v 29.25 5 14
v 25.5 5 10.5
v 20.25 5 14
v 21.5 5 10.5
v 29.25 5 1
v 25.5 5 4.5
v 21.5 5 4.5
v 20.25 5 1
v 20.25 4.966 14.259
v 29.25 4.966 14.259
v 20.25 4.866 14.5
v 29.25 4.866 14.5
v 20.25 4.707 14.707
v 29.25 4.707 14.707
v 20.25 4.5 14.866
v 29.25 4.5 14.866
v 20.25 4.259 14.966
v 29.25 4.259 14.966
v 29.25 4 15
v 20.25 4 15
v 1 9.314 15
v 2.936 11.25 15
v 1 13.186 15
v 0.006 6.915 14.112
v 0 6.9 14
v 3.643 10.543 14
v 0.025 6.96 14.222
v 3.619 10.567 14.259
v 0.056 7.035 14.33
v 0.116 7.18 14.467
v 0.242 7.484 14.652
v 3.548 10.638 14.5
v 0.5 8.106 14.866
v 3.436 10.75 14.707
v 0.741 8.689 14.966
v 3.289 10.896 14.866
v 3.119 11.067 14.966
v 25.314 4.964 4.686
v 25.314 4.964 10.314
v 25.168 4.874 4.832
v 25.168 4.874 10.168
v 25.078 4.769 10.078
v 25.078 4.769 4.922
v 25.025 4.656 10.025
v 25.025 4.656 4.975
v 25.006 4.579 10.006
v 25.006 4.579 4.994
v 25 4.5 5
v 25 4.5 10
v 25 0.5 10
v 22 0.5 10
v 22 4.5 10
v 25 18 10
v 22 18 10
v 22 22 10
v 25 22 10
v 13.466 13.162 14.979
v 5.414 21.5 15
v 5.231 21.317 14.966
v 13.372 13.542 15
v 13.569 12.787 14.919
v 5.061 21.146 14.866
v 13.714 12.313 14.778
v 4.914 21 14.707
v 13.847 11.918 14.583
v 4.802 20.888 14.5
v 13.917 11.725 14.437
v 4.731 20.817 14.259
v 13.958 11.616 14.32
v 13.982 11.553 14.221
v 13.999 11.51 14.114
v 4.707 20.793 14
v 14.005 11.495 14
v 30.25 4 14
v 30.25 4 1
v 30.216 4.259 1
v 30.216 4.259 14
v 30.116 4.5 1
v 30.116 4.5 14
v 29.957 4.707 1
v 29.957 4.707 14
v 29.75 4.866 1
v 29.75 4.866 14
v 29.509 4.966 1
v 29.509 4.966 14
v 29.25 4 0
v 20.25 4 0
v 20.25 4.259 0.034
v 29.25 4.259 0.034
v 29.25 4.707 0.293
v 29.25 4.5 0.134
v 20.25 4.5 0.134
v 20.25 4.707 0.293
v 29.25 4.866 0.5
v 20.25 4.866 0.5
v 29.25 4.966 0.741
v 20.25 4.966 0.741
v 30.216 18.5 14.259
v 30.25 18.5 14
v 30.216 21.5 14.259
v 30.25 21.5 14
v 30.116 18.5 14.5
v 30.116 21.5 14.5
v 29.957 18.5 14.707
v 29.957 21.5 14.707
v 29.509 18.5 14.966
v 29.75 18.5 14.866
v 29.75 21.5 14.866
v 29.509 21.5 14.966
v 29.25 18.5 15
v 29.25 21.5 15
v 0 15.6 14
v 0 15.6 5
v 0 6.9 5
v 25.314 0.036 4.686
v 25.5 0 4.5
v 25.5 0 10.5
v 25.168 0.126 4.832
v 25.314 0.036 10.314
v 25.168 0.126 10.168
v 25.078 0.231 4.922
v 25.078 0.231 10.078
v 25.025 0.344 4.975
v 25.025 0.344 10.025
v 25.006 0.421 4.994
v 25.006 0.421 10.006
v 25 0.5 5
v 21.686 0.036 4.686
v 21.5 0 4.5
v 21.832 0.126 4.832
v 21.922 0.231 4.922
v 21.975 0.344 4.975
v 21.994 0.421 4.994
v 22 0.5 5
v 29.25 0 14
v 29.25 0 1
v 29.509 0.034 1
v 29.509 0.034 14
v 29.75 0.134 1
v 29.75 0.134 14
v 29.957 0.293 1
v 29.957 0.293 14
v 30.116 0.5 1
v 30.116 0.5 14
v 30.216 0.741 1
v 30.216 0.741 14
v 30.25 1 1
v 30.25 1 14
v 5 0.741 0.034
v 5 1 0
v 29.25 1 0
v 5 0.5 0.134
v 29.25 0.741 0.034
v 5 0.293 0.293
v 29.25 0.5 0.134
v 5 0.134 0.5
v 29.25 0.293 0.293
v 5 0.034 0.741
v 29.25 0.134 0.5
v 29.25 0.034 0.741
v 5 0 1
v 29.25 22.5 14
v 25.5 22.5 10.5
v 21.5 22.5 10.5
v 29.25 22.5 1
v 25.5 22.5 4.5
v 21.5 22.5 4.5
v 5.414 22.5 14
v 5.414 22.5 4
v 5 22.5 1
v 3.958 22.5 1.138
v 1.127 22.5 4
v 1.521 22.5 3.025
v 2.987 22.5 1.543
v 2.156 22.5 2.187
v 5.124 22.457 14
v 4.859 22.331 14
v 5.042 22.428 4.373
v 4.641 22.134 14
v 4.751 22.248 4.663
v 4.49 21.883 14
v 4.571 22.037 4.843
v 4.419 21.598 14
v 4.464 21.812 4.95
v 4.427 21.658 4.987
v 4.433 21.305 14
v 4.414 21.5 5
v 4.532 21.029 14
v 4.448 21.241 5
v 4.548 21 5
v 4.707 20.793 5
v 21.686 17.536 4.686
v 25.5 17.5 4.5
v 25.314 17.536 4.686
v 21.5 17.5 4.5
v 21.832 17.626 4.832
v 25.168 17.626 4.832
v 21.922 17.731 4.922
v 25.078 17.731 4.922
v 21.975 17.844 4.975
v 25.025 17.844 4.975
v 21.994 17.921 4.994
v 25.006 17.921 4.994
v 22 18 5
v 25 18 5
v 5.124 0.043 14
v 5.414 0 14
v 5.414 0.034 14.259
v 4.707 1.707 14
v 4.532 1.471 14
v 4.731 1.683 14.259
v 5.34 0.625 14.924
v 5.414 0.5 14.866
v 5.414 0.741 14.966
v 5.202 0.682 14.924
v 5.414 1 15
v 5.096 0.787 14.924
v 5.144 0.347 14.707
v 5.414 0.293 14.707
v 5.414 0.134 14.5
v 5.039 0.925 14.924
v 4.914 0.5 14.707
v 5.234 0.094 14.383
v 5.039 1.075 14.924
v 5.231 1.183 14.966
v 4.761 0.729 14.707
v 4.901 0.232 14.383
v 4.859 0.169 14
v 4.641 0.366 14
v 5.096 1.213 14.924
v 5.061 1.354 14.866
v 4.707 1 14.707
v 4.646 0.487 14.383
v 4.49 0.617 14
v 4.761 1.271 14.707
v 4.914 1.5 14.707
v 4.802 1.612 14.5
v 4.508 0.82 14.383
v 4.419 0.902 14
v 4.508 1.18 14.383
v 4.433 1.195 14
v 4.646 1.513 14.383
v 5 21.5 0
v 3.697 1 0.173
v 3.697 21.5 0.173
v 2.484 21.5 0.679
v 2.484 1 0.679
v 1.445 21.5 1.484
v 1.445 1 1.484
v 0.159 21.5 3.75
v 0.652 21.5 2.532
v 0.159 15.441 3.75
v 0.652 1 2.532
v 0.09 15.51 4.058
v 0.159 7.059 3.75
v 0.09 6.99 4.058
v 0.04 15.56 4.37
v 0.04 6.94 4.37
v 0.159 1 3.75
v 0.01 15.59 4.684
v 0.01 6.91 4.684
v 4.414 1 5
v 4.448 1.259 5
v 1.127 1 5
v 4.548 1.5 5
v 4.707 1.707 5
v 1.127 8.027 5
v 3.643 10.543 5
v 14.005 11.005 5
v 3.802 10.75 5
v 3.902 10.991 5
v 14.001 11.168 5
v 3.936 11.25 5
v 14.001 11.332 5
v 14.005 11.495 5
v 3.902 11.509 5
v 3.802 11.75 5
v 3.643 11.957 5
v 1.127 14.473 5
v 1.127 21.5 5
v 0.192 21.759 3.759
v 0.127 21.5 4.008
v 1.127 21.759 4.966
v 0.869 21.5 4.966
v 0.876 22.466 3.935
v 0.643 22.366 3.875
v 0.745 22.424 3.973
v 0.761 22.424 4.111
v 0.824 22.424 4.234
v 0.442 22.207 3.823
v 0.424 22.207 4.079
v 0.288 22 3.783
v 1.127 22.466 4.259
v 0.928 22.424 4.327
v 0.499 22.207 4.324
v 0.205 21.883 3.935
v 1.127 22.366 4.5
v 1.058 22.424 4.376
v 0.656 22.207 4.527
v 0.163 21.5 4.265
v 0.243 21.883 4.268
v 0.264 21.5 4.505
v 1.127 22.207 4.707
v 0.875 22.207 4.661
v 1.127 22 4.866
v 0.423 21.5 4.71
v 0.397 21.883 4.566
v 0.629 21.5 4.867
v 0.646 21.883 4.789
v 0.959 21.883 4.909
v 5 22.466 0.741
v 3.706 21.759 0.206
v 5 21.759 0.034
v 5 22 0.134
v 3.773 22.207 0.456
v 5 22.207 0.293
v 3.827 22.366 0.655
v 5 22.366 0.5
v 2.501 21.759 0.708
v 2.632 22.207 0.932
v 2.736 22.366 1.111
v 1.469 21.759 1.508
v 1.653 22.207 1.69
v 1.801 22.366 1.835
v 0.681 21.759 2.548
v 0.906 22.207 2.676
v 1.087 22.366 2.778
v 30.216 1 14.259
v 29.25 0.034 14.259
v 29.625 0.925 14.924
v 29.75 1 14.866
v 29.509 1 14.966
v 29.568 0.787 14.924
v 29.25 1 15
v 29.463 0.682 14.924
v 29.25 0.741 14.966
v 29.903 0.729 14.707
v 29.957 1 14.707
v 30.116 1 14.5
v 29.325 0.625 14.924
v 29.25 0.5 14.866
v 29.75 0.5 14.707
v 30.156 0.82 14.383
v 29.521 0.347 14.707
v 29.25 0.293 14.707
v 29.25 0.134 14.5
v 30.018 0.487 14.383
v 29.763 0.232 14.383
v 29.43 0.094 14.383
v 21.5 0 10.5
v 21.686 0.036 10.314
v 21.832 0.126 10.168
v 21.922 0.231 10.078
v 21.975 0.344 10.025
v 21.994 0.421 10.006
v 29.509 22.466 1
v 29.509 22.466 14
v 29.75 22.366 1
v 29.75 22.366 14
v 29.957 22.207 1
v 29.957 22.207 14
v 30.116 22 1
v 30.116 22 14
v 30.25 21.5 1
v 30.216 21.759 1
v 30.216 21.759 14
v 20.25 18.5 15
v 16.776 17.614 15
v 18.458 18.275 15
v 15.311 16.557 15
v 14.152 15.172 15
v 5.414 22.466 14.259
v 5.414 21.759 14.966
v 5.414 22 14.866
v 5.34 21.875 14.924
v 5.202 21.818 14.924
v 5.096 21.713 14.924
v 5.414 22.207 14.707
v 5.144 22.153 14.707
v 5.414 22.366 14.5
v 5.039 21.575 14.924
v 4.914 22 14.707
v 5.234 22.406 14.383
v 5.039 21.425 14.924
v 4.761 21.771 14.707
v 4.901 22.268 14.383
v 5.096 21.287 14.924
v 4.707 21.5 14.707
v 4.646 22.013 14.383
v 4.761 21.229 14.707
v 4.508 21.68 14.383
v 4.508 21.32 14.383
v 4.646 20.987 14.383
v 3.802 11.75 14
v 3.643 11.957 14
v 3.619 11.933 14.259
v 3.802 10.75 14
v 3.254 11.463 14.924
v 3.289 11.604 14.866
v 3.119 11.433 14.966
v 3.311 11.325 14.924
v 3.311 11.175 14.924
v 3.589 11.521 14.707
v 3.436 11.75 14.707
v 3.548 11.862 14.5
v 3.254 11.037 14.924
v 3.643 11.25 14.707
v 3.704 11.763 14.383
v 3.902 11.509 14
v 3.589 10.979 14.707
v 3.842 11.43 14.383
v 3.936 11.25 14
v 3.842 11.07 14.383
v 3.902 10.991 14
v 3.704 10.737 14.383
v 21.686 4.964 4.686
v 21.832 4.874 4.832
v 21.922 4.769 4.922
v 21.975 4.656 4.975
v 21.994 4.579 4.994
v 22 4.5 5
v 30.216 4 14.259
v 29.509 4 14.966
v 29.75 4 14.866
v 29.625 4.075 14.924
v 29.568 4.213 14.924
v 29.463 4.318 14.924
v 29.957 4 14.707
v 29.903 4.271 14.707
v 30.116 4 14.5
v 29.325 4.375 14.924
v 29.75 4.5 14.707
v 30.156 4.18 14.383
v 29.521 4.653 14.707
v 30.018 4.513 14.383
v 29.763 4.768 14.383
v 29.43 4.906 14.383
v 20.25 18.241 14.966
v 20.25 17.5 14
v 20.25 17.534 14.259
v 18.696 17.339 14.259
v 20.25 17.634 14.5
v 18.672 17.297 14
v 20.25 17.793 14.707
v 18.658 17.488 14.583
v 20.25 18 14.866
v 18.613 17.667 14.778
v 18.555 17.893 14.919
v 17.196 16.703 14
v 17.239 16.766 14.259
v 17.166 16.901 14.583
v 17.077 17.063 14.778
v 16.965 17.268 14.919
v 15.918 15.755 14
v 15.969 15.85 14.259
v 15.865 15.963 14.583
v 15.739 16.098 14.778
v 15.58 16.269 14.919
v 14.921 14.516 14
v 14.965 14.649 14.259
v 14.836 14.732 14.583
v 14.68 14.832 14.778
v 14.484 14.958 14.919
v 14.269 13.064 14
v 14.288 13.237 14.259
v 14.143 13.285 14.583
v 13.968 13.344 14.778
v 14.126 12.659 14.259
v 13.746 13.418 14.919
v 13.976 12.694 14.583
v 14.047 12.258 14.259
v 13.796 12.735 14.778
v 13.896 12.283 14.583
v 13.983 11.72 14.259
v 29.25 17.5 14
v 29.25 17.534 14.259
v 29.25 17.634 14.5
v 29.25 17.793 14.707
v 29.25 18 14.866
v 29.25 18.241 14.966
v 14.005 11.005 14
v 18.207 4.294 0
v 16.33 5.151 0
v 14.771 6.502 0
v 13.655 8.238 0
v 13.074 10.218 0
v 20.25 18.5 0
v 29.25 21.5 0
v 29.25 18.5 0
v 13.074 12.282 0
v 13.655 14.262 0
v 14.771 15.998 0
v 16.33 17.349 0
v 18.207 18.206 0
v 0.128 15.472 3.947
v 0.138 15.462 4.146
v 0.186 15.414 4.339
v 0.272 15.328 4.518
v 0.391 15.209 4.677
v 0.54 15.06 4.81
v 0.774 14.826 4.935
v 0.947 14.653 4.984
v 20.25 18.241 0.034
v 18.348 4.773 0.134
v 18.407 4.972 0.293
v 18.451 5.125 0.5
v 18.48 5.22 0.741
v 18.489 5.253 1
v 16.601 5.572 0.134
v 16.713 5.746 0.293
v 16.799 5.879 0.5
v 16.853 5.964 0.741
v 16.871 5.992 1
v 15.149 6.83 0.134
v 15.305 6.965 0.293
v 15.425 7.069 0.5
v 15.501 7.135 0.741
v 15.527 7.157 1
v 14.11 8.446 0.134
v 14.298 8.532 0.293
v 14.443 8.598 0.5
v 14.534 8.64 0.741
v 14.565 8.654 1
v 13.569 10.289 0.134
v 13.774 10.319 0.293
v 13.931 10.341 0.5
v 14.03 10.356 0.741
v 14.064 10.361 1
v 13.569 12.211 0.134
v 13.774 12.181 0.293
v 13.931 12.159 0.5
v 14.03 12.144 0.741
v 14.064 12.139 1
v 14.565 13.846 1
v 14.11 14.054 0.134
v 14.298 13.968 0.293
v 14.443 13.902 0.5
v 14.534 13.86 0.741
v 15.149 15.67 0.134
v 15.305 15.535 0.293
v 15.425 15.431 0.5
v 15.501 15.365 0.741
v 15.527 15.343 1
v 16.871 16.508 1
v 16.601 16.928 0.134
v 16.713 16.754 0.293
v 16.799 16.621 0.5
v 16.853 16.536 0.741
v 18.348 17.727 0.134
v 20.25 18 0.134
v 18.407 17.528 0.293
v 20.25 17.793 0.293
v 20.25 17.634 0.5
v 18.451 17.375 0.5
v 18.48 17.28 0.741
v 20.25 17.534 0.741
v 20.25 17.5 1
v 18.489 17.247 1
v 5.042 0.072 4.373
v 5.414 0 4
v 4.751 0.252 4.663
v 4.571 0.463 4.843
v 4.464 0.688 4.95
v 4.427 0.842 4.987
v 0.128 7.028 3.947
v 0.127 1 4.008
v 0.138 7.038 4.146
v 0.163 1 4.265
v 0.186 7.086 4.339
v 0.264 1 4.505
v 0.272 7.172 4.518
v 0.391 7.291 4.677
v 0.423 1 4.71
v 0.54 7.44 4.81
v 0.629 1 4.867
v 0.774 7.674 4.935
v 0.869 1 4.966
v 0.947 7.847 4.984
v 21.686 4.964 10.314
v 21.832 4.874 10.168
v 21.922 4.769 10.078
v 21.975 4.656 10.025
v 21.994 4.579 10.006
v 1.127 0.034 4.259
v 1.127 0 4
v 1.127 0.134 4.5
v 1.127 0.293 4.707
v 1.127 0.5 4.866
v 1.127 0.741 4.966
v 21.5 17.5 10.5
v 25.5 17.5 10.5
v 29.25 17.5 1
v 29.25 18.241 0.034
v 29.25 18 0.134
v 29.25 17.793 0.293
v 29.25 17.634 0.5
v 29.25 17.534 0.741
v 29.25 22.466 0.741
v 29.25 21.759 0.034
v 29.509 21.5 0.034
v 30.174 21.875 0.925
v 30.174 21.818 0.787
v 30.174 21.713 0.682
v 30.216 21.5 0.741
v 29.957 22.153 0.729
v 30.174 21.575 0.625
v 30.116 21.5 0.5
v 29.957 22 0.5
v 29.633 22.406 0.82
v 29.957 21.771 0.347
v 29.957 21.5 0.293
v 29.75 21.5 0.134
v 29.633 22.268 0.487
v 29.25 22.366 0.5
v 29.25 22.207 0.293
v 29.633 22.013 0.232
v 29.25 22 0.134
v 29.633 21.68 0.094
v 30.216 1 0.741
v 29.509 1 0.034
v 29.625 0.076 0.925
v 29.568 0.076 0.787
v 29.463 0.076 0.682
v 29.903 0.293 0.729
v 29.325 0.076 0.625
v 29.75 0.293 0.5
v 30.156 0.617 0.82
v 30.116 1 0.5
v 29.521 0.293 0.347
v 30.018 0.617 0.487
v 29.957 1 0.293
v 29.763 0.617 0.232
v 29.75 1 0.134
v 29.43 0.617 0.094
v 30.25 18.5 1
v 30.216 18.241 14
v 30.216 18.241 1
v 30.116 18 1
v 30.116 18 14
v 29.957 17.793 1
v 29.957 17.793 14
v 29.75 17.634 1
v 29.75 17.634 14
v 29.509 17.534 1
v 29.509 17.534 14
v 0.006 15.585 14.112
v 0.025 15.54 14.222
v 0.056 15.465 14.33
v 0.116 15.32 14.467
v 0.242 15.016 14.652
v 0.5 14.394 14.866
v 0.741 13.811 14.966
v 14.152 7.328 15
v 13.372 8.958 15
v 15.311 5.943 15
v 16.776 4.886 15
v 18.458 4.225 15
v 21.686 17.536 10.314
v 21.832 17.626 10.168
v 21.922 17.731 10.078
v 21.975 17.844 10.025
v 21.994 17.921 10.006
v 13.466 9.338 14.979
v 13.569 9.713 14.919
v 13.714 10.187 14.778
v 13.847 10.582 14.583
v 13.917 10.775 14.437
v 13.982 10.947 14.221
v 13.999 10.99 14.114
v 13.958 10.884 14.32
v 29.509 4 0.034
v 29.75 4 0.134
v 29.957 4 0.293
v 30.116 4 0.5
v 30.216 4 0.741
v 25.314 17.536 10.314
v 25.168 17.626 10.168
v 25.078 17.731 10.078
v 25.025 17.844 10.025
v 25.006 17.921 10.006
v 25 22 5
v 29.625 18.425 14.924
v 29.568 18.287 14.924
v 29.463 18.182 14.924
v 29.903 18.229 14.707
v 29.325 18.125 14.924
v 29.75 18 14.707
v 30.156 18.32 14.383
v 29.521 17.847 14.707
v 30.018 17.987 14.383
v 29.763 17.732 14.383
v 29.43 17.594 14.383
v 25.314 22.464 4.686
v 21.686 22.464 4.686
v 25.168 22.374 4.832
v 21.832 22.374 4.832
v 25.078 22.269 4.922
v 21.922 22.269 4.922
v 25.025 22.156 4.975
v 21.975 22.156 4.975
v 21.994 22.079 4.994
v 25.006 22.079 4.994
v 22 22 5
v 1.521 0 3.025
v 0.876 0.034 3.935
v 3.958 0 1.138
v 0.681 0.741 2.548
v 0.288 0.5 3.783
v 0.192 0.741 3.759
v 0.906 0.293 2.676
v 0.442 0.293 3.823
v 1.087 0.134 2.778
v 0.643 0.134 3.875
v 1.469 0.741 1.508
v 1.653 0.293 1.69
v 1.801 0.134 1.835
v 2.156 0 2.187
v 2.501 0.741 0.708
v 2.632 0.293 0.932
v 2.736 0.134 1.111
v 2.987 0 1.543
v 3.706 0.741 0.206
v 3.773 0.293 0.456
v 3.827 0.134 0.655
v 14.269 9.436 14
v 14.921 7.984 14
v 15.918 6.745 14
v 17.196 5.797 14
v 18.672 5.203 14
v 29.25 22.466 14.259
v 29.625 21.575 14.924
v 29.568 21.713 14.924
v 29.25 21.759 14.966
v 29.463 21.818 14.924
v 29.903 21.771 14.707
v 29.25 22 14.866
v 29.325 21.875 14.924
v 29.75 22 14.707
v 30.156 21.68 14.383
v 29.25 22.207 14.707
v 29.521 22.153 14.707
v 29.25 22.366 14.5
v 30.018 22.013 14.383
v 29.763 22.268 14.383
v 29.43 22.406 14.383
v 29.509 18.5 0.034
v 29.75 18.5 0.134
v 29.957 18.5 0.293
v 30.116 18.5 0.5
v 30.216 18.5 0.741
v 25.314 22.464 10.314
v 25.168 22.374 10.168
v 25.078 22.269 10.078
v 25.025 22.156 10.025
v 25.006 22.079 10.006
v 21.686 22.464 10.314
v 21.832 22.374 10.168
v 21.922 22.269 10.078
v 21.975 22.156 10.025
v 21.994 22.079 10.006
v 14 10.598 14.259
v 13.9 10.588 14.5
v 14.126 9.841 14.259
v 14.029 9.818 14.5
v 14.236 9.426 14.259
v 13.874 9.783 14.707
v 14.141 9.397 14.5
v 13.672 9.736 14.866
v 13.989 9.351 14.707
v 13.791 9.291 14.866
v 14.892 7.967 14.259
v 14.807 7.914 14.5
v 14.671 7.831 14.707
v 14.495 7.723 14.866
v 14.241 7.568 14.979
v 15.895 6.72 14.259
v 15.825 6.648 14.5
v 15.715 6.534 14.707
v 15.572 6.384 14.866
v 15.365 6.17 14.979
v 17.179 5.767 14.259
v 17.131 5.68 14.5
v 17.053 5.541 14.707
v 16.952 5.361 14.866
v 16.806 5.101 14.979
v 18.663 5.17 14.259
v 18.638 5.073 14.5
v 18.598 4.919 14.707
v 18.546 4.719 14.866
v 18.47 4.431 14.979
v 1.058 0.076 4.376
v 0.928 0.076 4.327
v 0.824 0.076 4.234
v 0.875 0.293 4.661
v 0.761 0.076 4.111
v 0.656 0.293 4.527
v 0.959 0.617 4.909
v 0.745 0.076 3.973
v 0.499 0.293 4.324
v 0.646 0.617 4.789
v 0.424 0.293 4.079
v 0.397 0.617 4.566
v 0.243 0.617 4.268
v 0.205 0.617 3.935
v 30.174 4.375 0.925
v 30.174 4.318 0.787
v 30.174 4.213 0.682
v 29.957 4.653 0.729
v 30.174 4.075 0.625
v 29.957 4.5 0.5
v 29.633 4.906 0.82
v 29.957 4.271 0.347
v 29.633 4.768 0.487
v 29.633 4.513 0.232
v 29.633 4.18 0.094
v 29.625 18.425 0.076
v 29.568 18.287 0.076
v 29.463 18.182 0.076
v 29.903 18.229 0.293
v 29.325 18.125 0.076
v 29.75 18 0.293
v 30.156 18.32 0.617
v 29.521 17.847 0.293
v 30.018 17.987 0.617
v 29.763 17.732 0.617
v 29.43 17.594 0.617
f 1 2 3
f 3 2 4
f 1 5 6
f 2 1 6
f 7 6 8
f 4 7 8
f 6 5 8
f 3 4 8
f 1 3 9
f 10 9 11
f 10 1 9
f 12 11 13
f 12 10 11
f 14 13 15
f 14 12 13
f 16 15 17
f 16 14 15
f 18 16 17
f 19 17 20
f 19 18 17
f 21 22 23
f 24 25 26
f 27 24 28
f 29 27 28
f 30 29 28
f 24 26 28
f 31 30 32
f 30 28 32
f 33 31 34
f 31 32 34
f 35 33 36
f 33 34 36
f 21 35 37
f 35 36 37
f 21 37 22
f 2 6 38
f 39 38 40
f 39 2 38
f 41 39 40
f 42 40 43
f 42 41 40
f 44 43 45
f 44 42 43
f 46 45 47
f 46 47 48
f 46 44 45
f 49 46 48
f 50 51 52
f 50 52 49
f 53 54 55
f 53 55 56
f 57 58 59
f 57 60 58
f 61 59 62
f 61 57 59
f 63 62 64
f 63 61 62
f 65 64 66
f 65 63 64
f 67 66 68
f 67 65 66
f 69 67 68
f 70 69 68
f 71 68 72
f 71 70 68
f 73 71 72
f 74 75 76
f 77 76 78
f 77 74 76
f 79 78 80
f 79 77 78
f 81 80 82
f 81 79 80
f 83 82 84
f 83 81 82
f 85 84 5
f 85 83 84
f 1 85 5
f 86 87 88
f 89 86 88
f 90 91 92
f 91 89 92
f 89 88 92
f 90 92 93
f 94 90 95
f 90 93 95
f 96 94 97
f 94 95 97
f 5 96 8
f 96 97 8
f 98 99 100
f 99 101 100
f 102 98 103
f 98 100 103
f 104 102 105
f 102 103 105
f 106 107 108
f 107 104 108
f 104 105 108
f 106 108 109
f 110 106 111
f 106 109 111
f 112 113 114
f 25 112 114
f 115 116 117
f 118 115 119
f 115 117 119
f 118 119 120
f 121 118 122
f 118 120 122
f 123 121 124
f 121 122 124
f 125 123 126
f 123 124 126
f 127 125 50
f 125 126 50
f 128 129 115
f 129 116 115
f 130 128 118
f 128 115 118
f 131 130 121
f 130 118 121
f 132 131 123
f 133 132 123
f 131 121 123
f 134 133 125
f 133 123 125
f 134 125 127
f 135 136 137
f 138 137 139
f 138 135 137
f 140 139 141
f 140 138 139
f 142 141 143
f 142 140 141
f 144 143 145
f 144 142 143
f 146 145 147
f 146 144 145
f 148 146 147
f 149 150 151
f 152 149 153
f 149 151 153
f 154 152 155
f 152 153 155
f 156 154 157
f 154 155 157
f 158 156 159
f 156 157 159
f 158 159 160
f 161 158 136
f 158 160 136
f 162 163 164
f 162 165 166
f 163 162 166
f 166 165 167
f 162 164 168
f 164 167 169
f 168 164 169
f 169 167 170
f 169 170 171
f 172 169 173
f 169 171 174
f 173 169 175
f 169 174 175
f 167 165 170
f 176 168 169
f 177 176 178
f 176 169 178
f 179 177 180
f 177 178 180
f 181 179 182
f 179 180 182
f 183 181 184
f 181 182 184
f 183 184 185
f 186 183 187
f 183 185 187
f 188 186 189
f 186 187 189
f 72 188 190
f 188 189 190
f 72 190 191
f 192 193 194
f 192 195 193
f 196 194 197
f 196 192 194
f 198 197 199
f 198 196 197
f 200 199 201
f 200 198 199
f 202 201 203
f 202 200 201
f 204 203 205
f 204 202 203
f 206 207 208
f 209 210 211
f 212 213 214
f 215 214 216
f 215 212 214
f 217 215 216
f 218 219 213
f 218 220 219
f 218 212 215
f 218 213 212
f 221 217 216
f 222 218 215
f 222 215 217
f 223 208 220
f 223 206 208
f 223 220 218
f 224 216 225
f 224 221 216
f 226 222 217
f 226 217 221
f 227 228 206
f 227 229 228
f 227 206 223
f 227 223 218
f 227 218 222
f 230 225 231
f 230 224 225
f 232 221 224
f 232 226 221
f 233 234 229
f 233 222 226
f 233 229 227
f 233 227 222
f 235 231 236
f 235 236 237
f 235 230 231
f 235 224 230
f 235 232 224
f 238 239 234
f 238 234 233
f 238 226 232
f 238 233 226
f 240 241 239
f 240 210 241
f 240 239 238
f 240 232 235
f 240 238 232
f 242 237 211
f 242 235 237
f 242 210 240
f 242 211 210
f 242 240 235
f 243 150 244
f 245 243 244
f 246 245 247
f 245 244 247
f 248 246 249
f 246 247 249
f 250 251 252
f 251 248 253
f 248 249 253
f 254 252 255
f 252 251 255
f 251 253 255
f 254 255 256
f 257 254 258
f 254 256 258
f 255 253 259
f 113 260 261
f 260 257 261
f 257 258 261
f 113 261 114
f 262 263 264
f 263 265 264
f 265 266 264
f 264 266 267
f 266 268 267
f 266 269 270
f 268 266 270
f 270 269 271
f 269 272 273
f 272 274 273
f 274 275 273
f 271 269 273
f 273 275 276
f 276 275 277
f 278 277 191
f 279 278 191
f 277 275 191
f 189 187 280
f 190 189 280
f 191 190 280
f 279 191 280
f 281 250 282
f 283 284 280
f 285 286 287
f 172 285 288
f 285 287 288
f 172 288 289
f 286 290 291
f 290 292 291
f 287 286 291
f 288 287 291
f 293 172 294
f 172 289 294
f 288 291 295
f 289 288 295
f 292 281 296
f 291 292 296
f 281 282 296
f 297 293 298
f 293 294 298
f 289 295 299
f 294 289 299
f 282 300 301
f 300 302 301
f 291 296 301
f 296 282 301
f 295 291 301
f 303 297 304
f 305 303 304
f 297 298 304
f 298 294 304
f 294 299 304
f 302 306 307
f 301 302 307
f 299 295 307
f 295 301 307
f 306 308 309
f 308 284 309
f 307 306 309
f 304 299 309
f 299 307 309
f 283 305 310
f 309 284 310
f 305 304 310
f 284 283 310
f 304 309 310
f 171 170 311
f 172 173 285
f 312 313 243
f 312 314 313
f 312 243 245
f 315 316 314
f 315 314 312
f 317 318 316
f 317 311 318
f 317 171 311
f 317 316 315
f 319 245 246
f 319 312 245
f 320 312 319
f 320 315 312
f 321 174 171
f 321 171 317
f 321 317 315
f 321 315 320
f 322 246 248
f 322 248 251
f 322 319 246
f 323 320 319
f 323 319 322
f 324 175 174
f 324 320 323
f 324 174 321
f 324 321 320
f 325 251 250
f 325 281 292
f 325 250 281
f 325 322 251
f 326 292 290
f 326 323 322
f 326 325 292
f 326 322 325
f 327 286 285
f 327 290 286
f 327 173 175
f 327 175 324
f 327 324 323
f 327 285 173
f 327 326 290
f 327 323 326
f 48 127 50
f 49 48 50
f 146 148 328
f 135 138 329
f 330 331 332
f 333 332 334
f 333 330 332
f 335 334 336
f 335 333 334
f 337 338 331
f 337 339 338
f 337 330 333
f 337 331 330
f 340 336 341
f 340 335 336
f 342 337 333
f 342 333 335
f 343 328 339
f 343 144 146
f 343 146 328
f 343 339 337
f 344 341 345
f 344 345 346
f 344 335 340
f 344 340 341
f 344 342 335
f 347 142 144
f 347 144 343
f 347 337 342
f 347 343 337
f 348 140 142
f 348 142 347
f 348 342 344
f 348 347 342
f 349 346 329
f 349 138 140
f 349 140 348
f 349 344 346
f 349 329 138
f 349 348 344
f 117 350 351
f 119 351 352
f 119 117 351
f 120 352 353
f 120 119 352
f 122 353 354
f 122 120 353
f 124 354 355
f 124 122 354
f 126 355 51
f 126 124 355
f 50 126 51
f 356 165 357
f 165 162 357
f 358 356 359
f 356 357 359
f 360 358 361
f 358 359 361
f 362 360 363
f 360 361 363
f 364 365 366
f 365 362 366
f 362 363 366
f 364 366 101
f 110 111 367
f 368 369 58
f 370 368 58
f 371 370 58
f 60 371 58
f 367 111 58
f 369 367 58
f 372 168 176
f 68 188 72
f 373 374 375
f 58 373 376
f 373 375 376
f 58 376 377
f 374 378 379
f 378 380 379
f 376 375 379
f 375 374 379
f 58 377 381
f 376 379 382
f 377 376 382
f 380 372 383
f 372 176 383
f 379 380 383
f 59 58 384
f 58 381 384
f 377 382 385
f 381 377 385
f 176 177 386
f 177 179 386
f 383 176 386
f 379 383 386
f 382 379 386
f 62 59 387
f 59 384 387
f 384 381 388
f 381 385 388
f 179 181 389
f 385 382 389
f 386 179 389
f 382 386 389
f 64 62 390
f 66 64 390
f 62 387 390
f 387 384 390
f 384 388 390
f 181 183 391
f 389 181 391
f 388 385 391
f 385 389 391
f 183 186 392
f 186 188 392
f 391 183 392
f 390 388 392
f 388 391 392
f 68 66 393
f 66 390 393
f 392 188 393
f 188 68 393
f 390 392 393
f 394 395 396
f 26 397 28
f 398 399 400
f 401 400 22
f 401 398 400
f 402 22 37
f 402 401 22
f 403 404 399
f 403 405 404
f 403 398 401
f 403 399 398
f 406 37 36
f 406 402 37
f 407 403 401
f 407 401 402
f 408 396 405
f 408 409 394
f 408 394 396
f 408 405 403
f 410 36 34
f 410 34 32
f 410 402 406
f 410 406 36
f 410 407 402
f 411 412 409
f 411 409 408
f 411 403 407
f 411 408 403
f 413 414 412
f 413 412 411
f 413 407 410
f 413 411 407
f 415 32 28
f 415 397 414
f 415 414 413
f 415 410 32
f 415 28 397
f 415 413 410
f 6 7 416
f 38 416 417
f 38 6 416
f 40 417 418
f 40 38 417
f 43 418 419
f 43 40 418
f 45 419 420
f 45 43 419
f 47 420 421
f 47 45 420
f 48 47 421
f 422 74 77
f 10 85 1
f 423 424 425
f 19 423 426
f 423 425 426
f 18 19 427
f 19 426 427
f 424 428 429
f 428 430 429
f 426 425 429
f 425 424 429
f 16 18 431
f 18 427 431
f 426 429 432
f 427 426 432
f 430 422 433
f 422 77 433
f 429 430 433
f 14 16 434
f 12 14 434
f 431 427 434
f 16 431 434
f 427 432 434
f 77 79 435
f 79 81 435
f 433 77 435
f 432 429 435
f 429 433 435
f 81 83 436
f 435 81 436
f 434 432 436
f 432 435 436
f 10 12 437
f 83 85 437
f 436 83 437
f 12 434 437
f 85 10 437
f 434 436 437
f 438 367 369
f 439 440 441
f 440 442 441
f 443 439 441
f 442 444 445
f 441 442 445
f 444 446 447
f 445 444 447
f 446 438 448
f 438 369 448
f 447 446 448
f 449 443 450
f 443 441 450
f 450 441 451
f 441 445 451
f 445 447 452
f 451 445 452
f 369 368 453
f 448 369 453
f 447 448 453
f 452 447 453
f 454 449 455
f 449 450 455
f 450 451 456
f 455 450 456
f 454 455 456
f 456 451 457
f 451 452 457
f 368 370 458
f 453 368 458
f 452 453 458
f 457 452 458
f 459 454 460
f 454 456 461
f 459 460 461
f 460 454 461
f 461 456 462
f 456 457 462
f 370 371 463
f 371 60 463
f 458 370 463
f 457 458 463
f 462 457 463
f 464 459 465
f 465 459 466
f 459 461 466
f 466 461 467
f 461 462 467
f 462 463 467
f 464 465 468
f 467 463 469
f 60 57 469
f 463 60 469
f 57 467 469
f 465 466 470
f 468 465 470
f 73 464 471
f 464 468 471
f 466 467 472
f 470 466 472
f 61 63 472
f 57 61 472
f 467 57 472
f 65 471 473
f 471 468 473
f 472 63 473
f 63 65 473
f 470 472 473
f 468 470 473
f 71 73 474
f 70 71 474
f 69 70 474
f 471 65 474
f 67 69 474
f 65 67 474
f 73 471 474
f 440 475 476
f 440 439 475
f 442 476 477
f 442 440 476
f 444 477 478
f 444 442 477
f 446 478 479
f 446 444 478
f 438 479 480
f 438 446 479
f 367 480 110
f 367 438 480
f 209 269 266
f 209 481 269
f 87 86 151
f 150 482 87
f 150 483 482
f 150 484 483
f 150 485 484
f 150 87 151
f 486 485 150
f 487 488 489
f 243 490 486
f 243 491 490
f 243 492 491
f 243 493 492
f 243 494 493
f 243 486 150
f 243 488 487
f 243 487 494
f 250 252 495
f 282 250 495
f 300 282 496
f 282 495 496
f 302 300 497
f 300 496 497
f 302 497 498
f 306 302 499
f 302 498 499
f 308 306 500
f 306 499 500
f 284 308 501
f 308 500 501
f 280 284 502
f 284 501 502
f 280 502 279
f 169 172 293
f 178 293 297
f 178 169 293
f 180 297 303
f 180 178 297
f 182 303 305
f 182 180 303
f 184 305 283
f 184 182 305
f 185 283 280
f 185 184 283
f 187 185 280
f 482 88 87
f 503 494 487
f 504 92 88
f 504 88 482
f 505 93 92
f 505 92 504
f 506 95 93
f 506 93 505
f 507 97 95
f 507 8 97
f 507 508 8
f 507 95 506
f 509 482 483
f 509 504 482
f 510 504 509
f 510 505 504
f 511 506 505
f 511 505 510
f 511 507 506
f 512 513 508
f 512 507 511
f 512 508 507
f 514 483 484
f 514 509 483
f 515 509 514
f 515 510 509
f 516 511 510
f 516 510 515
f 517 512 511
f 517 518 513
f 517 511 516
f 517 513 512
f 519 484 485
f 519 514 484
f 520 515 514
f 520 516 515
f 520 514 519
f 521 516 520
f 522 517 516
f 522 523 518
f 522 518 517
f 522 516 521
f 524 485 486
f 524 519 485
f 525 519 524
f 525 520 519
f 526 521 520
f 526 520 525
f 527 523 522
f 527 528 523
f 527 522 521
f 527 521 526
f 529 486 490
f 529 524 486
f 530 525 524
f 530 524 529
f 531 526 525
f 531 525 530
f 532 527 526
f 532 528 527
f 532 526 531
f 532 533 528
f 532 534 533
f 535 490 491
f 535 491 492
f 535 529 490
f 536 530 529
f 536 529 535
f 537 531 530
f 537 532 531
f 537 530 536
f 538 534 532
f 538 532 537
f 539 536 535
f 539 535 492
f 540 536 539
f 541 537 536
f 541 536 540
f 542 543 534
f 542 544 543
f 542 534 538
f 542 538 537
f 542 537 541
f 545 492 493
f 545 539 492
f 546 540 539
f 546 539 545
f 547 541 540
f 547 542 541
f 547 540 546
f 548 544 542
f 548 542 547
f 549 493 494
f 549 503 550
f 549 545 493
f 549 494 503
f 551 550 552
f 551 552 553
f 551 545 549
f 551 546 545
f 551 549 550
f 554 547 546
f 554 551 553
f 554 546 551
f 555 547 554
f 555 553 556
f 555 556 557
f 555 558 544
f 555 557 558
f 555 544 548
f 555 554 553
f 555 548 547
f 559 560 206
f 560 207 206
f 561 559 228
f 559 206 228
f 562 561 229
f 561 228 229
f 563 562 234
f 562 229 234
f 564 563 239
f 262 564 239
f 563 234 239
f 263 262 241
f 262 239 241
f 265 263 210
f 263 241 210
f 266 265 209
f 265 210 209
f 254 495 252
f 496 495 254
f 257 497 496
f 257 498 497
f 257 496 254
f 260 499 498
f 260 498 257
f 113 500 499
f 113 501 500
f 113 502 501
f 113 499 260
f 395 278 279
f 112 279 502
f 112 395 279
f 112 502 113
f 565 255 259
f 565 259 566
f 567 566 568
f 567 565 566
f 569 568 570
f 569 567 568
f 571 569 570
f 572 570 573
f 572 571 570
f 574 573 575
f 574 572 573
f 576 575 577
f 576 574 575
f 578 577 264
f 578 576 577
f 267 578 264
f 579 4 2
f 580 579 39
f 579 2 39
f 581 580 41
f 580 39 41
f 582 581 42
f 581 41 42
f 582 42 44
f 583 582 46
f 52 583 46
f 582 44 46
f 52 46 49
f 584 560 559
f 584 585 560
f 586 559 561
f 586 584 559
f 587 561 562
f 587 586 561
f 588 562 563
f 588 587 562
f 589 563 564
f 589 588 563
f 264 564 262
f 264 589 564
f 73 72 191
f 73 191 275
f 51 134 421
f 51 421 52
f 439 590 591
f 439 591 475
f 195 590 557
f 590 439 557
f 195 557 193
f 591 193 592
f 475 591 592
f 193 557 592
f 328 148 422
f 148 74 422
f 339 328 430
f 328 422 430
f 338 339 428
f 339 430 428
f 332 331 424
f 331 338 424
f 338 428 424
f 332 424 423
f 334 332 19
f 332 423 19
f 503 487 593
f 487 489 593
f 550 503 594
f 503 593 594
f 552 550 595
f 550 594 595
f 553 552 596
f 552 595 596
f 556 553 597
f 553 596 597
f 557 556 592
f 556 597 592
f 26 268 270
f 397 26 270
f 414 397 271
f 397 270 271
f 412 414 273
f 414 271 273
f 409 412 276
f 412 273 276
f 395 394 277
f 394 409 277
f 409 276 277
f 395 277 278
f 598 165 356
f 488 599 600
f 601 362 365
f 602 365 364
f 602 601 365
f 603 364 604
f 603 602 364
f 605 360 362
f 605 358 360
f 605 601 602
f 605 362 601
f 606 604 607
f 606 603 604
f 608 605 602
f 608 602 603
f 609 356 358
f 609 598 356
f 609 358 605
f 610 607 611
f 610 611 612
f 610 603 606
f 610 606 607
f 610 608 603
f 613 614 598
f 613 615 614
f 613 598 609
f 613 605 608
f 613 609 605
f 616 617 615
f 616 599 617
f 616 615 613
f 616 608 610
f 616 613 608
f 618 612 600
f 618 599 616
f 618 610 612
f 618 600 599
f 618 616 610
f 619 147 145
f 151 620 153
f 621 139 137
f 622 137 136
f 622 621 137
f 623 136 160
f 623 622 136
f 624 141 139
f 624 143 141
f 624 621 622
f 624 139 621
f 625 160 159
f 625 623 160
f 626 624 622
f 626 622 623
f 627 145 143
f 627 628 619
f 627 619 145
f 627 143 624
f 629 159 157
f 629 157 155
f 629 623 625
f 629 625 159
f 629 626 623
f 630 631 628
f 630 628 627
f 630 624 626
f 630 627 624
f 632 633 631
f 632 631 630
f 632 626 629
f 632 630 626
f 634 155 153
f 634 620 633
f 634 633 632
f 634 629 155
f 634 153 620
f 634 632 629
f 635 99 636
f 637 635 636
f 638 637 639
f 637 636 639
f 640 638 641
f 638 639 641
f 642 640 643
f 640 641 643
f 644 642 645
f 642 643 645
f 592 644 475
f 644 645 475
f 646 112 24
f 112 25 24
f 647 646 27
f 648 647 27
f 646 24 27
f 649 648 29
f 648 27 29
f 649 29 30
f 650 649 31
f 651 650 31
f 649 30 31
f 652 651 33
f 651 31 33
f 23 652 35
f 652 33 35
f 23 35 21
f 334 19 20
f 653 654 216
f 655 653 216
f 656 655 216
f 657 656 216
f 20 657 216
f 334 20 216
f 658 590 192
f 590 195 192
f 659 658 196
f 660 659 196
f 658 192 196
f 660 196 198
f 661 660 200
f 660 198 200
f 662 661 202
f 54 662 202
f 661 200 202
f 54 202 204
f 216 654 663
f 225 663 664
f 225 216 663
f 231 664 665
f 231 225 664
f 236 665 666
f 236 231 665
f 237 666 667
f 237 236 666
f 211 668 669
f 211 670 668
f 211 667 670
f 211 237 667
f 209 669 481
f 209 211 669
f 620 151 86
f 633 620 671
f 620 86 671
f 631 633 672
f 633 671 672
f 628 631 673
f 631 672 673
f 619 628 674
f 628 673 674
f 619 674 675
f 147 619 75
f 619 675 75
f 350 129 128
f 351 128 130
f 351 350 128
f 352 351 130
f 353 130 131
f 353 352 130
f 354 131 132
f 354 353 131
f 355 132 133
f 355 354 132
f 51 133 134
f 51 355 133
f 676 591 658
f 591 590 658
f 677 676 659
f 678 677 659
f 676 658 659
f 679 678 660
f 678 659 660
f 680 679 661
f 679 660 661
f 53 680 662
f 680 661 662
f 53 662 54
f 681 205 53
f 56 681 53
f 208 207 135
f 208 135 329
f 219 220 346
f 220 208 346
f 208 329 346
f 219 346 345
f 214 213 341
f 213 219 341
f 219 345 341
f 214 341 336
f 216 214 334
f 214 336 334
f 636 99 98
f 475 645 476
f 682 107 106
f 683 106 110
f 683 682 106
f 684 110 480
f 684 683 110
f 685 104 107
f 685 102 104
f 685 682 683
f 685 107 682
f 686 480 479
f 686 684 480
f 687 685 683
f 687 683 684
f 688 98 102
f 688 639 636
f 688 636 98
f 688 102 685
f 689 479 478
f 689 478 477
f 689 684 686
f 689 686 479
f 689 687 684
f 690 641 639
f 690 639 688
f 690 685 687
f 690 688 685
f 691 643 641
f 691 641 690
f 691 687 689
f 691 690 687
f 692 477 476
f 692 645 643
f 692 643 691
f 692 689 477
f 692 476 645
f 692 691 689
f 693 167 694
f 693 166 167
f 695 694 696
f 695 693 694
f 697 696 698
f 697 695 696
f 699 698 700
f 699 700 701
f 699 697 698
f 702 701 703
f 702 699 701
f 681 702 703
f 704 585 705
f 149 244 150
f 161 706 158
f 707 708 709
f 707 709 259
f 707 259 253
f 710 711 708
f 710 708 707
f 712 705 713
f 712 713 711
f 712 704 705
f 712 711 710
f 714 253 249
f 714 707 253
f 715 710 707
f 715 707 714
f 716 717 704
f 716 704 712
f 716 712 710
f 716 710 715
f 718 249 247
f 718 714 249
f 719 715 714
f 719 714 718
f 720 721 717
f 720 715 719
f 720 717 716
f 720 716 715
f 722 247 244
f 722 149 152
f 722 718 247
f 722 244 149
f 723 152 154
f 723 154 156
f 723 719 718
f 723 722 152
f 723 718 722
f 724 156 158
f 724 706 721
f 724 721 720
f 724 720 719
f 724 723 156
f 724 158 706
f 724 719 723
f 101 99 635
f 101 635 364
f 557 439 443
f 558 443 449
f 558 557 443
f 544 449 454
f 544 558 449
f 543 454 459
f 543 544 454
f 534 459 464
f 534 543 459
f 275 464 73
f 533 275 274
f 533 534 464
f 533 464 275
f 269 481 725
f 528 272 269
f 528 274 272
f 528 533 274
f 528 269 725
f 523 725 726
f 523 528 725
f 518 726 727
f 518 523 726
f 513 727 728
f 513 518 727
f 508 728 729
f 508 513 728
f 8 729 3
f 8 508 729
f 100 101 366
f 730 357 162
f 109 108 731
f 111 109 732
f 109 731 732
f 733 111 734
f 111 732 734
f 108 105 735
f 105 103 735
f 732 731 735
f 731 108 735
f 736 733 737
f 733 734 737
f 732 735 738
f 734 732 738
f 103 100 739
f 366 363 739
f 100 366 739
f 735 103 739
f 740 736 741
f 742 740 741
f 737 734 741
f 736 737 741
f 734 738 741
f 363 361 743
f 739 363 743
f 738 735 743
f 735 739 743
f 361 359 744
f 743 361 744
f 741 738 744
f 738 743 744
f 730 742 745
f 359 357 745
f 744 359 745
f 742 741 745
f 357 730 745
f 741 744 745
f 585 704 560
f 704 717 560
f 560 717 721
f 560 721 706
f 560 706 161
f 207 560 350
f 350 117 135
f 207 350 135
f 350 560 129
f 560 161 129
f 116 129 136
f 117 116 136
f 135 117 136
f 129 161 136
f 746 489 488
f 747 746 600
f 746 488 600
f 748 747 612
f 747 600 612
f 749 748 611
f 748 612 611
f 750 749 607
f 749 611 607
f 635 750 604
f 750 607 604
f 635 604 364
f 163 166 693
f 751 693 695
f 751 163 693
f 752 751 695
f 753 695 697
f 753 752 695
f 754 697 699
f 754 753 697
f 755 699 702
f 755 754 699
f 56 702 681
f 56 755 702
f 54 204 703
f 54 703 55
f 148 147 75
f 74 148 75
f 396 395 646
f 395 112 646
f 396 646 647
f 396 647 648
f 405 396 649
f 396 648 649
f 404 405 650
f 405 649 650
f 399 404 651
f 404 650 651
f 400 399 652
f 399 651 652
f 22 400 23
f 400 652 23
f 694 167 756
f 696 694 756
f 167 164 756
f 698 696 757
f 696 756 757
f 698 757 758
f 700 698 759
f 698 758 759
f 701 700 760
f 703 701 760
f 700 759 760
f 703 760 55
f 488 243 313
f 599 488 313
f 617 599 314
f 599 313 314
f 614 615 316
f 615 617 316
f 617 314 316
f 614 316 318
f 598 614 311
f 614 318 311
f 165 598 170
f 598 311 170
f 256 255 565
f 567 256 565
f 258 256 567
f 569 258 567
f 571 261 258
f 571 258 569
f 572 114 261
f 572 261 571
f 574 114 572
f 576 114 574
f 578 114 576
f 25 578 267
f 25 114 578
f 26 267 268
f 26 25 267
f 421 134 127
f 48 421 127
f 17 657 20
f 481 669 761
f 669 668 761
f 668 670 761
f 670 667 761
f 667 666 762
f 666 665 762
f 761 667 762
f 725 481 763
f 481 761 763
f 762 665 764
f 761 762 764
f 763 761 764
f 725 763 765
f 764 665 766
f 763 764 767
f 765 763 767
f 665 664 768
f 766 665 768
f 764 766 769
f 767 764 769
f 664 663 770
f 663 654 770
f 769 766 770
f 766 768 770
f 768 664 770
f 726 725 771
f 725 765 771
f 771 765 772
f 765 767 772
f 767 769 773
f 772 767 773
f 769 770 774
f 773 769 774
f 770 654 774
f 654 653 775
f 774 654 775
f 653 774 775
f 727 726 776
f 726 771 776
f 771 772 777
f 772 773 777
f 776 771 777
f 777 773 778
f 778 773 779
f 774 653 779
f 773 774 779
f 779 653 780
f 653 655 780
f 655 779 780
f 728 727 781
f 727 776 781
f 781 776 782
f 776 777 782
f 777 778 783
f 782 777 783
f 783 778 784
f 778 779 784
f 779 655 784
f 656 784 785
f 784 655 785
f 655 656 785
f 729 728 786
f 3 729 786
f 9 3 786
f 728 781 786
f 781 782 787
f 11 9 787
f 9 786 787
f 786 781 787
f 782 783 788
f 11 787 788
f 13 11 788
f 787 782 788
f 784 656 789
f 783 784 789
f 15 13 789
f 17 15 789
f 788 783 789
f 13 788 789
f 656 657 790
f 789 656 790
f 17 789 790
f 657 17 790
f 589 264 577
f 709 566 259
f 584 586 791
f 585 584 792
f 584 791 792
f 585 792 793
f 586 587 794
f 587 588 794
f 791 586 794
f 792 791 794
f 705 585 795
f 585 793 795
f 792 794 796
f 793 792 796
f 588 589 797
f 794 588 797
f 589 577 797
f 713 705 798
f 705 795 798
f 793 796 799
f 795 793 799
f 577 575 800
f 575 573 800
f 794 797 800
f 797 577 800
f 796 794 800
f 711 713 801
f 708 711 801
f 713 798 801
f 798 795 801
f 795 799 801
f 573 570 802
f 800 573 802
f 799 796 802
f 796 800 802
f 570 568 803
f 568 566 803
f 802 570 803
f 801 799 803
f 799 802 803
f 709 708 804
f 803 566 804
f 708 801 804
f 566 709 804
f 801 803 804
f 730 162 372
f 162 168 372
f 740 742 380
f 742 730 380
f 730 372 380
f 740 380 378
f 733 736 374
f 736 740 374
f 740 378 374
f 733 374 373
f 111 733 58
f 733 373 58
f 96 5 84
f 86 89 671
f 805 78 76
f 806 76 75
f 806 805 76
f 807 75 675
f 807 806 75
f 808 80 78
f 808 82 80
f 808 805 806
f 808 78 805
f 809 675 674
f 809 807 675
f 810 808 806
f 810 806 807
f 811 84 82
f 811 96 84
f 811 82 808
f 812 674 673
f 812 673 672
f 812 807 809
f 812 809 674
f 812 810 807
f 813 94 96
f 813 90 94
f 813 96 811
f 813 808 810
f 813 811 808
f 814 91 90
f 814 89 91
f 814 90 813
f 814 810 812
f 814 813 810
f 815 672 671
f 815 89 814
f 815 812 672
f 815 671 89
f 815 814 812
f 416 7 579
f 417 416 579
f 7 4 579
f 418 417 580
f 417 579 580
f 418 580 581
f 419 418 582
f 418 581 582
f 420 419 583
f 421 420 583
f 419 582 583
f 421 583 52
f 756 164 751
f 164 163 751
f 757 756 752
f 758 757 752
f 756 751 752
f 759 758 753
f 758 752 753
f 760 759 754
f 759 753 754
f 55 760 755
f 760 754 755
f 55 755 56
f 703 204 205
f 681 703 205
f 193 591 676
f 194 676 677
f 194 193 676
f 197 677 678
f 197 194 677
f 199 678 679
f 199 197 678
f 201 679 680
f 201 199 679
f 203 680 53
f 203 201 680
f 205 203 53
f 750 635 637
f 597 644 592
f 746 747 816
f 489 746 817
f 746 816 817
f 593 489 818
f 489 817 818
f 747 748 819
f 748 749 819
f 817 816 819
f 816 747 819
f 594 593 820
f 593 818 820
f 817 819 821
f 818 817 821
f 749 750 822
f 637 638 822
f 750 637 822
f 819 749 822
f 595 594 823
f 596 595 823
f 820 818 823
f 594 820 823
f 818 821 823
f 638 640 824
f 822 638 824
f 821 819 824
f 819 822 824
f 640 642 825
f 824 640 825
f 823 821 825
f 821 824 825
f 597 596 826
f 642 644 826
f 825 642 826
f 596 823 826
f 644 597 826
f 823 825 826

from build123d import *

# Parameters (mm, degrees)
PAD_DEPTH       = 15
POCKET_DEPTH    = 10
FILLET_R        = 5
SKETCH002_W     = 3
SKETCH002_H     = 5
POCKET001_DEPTH = 22.501
FILLET001_R     = 1
FILLET002_R     = 0.5


with BuildPart() as part:
    # Sketch → Pad (new body)
    with BuildSketch(Plane.XY):
        with BuildLine():
            ThreePointArc((20.25, 17.5), (14, 11.25), (20.25, 5))
            Line((30.25, 5), (20.25, 5))
            Line((30.25, 0), (30.25, 5))
            Line((0, 0), (30.25, 0))
            Line((0, 22.5), (0, 0))
            Line((30.25, 22.5), (0, 22.5))
            Line((30.25, 17.5), (30.25, 22.5))
            Line((20.25, 17.5), (30.25, 17.5))
        make_face()
    extrude(amount=PAD_DEPTH)

    # Sketch001 (on Face10 of Pad) → Pocket (cut)
    with BuildSketch(Plane.XY.offset(15)):
        Polygon((-0.75, 16.35), (-0.75, 26.25), (14.25, 11.25), (-0.75, -3.75), (-0.75, 6.15), (4.35, 11.25), align=None)
    extrude(amount=-POCKET_DEPTH, mode=Mode.SUBTRACT)

    # Fillet
    fillet_edges = [part.edges().sort_by_distance(p)[0] for p in [
        (0, 11.25, 0),
    ]]
    fillet(fillet_edges, radius=FILLET_R)

    # Sketch002 (on Face2 of Fillet) → Pocket001 (cut, through all)
    with BuildSketch(Plane.XZ):
        with Locations((23.5, 7.5)):
            Rectangle(SKETCH002_W, SKETCH002_H)
    extrude(amount=-POCKET001_DEPTH, mode=Mode.SUBTRACT)

    # Fillet001
    fillet001_edges = [part.edges().sort_by_distance(p)[0] for p in [
        (17.625, 22.5, 0),
        (30.25, 22.5, 7.5),
        (30.25, 17.5, 7.5),
        (30.25, 20, 0),
        (30.25, 20, 15),
        (25.25, 17.5, 0),
        (14, 11.25, 0),
        (25.25, 5, 0),
        (30.25, 5, 7.5),
        (30.25, 2.5, 0),
        (30.25, 0, 7.5),
        (30.25, 2.5, 15),
        (17.625, 0, 0),
        (16.625, 0, 15),
        (16.625, 22.5, 15),
        (15.918137, 6.744729, 15),
        (15.918137, 15.755271, 15),
        (25.25, 17.5, 15),
        (25.25, 5, 15),
        (8.502406, 16.997594, 15),
        (8.502406, 5.502406, 15),
        (4.35, 11.25, 10),
        (2.175, 13.425, 15),
        (0, 11.25, 15),
        (3, 22.5, 10),
        (3, 0, 10),
        (0, 3.45, 5),
        (1.5, 0, 5),
        (2.175, 9.075, 15),
        (1.5, 22.5, 5),
        (0, 19.05, 5),
    ]]
    fillet(fillet001_edges, radius=FILLET001_R)

    # Fillet002
    fillet002_edges = [part.edges().sort_by_distance(p)[0] for p in [
        (23.5, 22.5, 10),
        (22, 22.5, 7.5),
        (23.5, 22.5, 5),
        (25, 22.5, 7.5),
        (25, 5, 7.5),
        (23.5, 5, 10),
        (22, 5, 7.5),
        (23.5, 5, 5),
        (23.5, 17.5, 10),
        (22, 17.5, 7.5),
        (23.5, 17.5, 5),
        (25, 17.5, 7.5),
        (23.5, 0, 10),
        (22, 0, 7.5),
        (23.5, 0, 5),
        (25, 0, 7.5),
    ]]
    fillet(fillet002_edges, radius=FILLET002_R)


solid = part.part
